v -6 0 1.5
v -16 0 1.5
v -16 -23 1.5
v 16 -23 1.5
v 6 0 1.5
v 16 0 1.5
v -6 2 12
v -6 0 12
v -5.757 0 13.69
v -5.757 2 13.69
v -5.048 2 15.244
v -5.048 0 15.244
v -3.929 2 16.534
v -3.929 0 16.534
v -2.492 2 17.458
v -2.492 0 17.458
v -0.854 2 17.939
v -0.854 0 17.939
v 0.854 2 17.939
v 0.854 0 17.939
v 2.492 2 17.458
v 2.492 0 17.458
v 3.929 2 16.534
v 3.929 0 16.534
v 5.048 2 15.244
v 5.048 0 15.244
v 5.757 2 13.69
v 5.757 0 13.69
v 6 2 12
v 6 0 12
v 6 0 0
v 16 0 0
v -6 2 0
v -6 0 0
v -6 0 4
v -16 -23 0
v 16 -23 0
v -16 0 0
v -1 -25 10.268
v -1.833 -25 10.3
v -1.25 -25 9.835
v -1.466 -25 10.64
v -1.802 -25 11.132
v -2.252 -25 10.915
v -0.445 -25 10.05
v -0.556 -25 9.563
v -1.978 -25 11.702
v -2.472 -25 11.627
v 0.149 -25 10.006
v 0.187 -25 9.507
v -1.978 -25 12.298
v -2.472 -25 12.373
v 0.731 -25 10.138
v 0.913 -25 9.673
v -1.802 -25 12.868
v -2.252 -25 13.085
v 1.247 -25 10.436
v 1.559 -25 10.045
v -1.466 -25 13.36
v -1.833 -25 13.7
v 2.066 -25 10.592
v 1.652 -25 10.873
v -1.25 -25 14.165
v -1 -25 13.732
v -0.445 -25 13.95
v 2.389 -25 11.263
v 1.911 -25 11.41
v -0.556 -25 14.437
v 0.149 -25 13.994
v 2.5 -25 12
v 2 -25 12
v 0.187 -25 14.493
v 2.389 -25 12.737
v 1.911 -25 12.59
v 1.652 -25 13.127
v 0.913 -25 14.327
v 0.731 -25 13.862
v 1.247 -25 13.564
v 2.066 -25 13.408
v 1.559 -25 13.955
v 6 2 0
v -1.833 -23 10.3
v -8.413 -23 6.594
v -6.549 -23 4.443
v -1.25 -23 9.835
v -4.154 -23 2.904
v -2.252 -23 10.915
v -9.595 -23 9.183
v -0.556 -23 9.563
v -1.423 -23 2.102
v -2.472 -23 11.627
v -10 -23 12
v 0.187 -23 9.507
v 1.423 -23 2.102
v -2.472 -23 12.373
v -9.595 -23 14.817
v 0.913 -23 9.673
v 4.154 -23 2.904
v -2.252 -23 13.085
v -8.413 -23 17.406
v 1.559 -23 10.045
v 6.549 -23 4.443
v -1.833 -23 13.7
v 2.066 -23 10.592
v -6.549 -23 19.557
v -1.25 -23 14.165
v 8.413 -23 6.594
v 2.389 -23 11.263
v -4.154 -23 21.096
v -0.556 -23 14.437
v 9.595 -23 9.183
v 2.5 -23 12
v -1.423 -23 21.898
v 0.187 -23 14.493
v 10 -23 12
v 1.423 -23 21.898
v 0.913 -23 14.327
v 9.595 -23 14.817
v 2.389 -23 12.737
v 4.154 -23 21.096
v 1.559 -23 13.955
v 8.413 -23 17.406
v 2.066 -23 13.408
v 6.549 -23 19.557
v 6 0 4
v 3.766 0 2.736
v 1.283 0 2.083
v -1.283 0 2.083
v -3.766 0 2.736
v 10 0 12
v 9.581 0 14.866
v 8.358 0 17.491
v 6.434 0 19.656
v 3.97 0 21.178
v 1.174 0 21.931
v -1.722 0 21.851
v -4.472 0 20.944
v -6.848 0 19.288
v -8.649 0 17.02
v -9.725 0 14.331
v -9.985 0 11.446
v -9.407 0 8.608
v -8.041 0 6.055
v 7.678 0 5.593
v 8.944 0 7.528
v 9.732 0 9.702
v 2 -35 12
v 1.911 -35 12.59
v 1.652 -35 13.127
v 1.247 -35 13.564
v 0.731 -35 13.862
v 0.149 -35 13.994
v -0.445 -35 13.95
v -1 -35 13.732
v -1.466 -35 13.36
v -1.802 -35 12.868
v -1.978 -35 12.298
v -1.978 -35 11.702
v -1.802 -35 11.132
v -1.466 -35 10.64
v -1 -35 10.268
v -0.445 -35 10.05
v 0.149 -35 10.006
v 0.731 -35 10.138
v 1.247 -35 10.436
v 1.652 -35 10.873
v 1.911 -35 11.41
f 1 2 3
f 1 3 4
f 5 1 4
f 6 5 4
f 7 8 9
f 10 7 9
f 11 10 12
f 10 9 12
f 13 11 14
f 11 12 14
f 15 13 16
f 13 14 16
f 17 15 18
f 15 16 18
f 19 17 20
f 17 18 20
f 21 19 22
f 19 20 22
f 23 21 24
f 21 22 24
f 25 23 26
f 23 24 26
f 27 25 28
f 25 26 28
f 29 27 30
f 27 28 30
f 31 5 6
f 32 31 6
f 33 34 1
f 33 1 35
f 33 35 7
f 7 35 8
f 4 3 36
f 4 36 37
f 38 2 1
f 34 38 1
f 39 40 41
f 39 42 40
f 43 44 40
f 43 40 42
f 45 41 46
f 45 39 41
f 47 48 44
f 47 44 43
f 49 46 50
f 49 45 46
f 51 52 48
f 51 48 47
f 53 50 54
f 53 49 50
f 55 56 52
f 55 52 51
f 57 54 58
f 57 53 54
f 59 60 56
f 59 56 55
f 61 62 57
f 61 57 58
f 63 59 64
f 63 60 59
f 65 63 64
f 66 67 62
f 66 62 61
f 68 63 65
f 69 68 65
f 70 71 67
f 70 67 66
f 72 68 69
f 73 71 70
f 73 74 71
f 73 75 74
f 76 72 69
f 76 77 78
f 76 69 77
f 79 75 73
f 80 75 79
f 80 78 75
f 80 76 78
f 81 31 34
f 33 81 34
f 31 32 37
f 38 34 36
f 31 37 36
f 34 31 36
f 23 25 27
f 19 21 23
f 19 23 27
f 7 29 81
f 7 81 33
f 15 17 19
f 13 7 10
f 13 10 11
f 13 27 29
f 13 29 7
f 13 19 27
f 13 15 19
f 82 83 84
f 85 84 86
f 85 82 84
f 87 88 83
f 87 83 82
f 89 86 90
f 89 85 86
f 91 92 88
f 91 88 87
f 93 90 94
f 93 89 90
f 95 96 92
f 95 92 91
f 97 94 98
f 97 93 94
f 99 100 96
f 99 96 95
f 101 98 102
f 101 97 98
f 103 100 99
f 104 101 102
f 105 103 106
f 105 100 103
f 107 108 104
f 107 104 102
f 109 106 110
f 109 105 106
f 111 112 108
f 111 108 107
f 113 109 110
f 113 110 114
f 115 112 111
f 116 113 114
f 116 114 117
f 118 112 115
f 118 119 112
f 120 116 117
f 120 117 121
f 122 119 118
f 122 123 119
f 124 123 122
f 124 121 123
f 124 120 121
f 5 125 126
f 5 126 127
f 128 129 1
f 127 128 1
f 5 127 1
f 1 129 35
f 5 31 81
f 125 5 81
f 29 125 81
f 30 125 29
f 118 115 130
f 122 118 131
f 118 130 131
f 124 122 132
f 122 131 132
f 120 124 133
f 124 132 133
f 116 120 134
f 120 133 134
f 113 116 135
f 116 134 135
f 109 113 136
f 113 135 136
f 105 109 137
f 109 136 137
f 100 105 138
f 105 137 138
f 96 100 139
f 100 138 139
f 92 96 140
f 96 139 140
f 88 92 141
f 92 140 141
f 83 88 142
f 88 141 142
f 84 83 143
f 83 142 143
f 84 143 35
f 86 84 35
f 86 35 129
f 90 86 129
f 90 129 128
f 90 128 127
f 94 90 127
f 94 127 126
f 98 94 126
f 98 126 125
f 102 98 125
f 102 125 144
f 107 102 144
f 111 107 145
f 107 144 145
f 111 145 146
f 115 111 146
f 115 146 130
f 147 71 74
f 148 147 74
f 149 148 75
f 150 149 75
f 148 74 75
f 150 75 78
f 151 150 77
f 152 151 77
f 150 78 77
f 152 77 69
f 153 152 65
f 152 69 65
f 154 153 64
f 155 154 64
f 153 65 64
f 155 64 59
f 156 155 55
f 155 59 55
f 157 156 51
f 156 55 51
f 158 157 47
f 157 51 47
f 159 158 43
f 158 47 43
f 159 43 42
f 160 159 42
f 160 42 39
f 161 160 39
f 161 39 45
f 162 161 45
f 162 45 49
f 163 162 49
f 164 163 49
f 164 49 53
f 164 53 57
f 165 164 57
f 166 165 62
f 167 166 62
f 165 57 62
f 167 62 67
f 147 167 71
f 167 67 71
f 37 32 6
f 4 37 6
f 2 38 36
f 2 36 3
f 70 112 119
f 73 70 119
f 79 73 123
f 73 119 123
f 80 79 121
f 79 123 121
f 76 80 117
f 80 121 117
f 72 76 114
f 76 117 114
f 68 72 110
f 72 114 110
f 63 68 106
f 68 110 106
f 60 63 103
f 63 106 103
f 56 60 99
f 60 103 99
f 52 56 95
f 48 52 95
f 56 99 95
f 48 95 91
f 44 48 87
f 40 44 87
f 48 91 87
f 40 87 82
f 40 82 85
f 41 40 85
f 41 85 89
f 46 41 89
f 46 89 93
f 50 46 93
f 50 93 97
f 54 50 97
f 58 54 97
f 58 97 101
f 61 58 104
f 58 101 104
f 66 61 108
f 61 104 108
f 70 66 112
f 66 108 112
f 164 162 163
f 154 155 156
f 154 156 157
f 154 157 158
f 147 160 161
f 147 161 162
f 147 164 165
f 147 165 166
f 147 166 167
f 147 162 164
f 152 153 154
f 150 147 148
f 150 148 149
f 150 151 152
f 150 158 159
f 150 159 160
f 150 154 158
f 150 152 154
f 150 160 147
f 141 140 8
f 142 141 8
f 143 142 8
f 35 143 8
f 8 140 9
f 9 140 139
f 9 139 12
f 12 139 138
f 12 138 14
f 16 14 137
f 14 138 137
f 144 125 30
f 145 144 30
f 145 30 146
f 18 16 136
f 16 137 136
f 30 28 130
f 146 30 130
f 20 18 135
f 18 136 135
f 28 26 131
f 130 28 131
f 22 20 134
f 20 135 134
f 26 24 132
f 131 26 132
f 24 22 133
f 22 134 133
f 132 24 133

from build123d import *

# Parameters (mm, degrees)
F0_R     = 10
F0_W     = 32
F0_H     = 1.5
F1_DEPTH = 23
F2_R     = 2.5
F3_DEPTH = 2
F4_R     = 2
F5_DEPTH = 10
F6_W     = 12
F6_H     = 12
F7_DEPTH = 2


with BuildPart() as f1:
    # F0 (on Front) → F1 (new body)
    with BuildSketch(Plane.XZ):
        with Locations((0, 12)):
            Circle(F0_R)
        with Locations((0, 0.75)):
            Rectangle(F0_W, F0_H)
    extrude(amount=F1_DEPTH)

    # F2 (on face) → F3 (join)
    with BuildSketch(Plane.XZ.offset(23)):
        with Locations((0, 12)):
            Circle(F2_R)
    extrude(amount=F3_DEPTH)

    # F4 (on face) → F5 (join)
    with BuildSketch(Plane.XZ.offset(25)):
        with Locations((0, 12)):
            Circle(F4_R)
    extrude(amount=F5_DEPTH)

    # F6 (on face) → F7 (join)
    with BuildSketch(Plane(origin=(0, 0, 0), x_dir=(-1, 0, 0), z_dir=(0, 1, 0))):
        with BuildLine():
            ThreePointArc((6, 12), (0, 18), (-6, 12))
            Line((-6, 12), (6, 12))
        make_face()
        with Locations((0, 6)):
            Rectangle(F6_W, F6_H)
    extrude(amount=F7_DEPTH)


solid = f1.part
